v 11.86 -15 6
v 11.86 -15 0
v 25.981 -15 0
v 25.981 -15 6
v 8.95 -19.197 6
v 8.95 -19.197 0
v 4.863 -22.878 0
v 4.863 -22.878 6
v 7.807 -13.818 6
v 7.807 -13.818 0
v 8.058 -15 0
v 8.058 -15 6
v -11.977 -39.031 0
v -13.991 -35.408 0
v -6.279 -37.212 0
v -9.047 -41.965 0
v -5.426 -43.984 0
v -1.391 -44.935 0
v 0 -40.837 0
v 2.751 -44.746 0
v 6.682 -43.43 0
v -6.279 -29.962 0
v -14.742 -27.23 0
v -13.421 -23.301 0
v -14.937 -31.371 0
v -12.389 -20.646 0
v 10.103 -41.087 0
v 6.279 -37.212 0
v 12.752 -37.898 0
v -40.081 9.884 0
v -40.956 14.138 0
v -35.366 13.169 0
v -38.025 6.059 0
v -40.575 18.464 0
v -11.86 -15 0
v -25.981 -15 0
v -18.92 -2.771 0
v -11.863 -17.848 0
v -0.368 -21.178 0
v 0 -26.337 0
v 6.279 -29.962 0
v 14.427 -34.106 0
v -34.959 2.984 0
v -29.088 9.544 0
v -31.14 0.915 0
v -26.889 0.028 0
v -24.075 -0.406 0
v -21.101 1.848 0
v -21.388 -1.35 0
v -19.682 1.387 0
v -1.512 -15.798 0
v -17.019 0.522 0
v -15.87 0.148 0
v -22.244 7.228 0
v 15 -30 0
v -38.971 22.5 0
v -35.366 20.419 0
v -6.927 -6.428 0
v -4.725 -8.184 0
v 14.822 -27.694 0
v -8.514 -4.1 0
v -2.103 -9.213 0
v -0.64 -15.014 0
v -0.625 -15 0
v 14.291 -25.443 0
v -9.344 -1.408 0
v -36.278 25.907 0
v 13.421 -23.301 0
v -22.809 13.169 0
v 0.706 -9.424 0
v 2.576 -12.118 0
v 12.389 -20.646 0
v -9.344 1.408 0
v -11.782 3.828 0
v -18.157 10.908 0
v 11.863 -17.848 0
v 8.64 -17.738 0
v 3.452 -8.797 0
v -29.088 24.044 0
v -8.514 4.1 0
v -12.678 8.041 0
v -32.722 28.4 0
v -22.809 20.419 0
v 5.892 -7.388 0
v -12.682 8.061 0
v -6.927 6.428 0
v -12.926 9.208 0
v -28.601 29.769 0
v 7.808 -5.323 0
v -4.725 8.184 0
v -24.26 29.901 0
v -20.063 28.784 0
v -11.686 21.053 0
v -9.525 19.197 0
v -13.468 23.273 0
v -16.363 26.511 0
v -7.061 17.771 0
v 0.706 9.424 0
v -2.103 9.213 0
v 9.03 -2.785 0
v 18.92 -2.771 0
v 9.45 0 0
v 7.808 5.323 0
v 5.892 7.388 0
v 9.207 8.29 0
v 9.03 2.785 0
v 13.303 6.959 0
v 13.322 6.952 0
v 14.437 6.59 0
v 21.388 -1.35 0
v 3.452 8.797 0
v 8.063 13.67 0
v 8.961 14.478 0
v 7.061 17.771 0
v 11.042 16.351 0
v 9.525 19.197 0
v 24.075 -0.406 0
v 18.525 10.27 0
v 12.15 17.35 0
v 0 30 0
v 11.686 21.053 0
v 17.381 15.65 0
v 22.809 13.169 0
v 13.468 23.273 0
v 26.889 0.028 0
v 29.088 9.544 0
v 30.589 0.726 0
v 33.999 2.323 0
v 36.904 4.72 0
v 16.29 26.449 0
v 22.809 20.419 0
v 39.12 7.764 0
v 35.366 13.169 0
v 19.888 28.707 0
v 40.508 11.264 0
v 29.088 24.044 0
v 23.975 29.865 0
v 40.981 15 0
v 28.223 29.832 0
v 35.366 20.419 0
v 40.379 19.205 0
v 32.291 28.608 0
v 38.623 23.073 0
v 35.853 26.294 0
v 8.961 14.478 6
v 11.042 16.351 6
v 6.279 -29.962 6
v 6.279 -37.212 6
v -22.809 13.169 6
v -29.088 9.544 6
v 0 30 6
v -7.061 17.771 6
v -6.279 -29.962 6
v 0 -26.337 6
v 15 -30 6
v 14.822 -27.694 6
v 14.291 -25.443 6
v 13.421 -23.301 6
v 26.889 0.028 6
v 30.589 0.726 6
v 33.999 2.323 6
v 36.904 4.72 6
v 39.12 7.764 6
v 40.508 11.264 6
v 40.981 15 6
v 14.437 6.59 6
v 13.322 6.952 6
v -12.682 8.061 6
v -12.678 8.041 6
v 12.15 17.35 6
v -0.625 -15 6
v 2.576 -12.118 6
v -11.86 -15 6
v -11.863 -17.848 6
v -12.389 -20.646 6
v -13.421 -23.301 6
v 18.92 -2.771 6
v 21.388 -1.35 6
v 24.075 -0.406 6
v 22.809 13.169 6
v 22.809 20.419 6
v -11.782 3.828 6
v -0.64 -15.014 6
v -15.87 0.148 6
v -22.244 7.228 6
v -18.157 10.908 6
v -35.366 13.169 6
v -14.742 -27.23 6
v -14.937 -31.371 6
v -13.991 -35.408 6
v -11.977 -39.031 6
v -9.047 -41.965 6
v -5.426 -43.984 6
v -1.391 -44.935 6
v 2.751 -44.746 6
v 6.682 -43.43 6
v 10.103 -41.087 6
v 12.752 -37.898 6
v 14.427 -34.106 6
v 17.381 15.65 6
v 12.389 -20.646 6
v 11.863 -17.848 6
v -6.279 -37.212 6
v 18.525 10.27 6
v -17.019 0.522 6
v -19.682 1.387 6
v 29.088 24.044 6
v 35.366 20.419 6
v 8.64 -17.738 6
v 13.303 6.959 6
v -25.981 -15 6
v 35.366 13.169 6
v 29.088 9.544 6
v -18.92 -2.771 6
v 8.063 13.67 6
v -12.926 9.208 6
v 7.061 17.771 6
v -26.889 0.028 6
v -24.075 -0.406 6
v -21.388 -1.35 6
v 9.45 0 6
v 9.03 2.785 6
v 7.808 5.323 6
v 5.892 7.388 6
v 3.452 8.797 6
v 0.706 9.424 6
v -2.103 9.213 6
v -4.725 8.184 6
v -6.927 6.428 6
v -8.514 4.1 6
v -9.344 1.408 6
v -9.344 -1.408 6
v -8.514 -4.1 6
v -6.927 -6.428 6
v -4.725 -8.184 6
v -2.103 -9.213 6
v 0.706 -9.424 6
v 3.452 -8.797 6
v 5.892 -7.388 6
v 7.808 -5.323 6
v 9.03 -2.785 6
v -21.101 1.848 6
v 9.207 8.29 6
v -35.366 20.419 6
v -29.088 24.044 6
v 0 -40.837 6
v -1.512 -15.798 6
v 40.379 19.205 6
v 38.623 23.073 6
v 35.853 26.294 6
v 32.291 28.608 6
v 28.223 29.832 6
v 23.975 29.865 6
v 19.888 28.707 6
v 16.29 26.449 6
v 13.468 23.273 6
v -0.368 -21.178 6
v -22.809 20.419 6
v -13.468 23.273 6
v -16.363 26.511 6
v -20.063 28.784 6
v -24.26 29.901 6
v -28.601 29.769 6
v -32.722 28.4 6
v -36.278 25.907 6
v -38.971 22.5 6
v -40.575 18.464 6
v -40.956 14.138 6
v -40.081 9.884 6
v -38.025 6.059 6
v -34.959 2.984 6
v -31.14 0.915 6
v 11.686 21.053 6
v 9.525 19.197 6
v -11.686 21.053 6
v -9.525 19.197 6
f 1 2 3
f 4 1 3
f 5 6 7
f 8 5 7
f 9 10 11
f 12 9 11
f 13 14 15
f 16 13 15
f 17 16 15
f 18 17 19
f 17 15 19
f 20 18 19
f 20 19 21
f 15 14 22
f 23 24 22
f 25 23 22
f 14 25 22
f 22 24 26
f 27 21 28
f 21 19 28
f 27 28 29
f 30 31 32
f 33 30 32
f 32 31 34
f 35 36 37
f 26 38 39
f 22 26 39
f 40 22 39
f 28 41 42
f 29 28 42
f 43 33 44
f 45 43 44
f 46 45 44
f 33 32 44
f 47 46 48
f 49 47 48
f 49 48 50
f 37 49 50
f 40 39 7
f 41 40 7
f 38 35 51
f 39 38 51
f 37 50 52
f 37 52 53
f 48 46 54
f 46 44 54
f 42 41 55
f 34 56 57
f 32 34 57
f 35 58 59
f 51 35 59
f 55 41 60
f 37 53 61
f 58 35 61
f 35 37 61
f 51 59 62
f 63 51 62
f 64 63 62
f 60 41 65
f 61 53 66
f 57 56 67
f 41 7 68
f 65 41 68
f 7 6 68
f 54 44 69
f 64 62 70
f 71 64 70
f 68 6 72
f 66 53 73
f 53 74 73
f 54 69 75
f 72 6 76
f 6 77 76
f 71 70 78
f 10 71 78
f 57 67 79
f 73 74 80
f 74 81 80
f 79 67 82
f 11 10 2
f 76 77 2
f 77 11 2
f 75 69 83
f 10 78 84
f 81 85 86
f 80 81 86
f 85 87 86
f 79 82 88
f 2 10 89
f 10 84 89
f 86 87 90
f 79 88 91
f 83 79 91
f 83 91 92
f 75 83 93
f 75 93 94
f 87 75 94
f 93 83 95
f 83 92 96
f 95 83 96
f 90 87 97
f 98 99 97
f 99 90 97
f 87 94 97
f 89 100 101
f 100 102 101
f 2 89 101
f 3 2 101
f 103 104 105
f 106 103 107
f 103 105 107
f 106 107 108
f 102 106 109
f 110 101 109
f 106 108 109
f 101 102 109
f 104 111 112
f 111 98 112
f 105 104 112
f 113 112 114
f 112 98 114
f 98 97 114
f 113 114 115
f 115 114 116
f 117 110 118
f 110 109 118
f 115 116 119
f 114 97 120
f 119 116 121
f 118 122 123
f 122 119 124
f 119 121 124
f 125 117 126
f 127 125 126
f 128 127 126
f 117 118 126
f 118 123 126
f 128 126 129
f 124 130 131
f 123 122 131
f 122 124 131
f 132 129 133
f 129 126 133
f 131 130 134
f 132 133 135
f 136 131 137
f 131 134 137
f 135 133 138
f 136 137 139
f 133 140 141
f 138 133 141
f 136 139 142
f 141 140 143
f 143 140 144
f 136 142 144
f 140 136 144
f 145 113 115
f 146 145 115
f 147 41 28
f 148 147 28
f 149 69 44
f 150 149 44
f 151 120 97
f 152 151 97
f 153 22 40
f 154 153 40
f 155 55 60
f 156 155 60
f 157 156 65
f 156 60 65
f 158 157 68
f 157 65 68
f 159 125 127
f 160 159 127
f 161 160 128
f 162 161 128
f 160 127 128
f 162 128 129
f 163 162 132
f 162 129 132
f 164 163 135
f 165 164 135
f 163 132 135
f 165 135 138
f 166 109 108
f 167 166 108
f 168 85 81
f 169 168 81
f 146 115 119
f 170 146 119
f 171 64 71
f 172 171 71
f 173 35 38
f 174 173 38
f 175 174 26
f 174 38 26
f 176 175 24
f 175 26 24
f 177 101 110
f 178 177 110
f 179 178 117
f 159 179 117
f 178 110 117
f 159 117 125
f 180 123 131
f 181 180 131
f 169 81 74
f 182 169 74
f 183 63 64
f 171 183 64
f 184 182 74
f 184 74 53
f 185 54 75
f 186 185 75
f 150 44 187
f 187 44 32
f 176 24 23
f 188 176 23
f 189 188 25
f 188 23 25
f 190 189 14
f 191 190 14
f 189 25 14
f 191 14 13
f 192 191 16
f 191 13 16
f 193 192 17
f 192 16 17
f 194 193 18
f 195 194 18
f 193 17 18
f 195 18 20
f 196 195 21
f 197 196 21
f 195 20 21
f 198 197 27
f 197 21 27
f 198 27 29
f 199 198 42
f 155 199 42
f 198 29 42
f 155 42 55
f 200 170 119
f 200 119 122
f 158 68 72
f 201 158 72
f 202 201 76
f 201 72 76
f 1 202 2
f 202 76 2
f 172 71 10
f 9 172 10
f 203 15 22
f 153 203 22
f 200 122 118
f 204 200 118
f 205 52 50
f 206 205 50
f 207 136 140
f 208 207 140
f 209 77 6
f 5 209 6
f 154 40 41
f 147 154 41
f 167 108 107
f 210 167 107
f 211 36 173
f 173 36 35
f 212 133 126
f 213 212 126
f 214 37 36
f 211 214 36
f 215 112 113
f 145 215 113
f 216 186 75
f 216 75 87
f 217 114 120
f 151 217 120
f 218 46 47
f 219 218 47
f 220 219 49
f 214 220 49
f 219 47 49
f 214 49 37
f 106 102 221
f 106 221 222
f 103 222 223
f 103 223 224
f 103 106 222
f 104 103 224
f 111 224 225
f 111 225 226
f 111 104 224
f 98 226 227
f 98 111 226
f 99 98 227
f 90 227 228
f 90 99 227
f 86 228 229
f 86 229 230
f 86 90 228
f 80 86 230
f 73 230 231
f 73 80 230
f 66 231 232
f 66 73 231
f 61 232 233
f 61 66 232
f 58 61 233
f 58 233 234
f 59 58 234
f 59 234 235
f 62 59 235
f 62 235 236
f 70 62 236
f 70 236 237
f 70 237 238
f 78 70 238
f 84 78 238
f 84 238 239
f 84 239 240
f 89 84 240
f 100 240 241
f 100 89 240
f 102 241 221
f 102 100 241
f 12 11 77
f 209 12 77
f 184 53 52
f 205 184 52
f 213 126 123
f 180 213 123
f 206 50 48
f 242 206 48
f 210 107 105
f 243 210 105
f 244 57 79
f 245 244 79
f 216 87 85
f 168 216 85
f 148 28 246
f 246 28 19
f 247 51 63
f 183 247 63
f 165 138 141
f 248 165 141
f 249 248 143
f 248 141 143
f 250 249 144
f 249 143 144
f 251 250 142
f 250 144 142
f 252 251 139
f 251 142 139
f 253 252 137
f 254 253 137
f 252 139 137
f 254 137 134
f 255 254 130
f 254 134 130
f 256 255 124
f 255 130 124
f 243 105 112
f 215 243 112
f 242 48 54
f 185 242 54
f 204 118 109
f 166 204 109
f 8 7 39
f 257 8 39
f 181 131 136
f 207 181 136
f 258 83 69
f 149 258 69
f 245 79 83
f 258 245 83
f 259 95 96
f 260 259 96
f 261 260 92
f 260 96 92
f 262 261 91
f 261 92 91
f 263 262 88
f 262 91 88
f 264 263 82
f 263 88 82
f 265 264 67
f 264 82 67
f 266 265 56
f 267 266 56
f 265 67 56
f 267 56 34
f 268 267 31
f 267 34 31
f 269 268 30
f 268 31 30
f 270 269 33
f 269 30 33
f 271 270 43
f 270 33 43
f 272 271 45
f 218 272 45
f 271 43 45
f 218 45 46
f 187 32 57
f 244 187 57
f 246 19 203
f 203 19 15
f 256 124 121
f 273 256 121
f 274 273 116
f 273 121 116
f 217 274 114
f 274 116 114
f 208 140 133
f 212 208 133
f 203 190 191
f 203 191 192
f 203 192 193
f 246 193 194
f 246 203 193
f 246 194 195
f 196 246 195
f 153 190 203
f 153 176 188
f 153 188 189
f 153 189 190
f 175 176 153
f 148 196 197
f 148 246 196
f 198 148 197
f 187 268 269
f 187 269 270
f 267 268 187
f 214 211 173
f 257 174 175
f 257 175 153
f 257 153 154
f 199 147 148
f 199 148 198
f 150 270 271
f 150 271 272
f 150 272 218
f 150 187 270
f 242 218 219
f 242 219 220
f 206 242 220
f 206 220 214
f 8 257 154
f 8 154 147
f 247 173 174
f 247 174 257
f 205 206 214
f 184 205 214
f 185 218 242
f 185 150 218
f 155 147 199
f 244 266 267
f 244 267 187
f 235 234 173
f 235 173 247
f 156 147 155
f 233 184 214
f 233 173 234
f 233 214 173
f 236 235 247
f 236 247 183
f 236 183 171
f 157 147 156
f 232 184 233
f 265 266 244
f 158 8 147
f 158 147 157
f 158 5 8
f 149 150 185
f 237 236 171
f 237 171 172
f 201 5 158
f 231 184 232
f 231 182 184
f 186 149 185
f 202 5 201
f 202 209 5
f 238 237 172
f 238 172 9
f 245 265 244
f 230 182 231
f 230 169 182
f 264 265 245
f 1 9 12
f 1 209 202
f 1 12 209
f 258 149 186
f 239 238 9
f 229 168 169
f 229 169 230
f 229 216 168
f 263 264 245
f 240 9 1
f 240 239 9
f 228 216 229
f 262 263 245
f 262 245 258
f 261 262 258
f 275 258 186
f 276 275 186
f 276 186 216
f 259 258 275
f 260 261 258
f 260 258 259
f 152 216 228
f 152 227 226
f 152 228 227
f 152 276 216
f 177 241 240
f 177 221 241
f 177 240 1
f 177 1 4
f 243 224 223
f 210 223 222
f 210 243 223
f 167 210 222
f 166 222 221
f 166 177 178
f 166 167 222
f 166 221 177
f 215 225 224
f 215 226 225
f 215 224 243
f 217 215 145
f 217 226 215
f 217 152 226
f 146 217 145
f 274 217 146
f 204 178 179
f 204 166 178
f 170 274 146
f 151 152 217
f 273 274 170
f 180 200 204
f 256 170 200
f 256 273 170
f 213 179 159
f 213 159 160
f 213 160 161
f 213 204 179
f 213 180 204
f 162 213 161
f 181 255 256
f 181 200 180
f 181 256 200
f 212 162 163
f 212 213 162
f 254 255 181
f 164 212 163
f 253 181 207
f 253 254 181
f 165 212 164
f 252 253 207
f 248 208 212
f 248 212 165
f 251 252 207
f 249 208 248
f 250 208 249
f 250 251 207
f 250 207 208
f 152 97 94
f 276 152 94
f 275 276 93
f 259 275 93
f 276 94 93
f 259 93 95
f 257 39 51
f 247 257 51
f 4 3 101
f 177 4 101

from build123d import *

# Parameters (mm, degrees)
F0_R     = 9.45
F1_DEPTH = 6


with BuildPart() as f1:
    # F0 (on Top) → F1 (new body)
    with BuildSketch(Plane.XY):
        Polygon((11.8595659331, -15), (25.9807621135, -15), (18.9201640233, -2.7706853759), (13.302852552, 6.9587834943), (9.2066626406, 8.2897162761), (8.0631483411, 13.6695280801), (8.9614312964, 14.478345686), (7.0605980902, 17.7706853759), (0, 30), (-7.0605980902, 17.7706853759), (-12.6779095615, 8.0412165057), (-11.7824362055, 3.8283455928), (-15.8697327457, 0.1481272578), (-17.0193308171, 0.521654314), (-18.9201640233, -2.7706853759), (-25.9807621135, -15), (-11.8595659331, -15), (-0.6249429905, -15), (2.5757735649, -12.1180618689), (7.8065844046, -13.8176553379), (8.0578995207, -15), align=None)
        Circle(F0_R, mode=Mode.SUBTRACT)
        with BuildLine():
            ThreePointArc((13.4207676072, -23.3005226447), (12.0614730092, -19.25910479), (11.8595659331, -15))
            Line((11.8595659331, -15), (8.0578995207, -15))
            Line((8.0578995207, -15), (8.6399217922, -17.7381995032))
            ThreePointArc((8.6399217922, -17.7381995032), (11.3755599368, -20.2226467731), (13.4207676072, -23.3005226447))
        make_face()
        with BuildLine():
            Line((13.302852552, 6.9587834943), (18.9201640233, -2.7706853759))
            ThreePointArc((18.9201640233, -2.7706853759), (22.7096105069, -0.815989638), (26.8892283353, 0.0275356362))
            ThreePointArc((26.8892283353, 0.0275356362), (19.1613457519, 1.6397769298), (13.3222745374, 6.9524729087))
            Line((13.3222745374, 6.9524729087), (13.302852552, 6.9587834943))
        make_face()
        with BuildLine():
            ThreePointArc((15, -30), (14.5998546929, -26.5584534078), (13.4207676072, -23.3005226447))
            ThreePointArc((13.4207676072, -23.3005226447), (11.3755599368, -20.2226467731), (8.6399217922, -17.7381995032))
            Line((8.6399217922, -17.7381995032), (8.9500987041, -19.1974671419))
            Line((8.9500987041, -19.1974671419), (4.8628021639, -22.8776854769))
            Line((4.8628021639, -22.8776854769), (-0.3680086757, -21.1780920079))
            Line((-0.3680086757, -21.1780920079), (-1.5115229752, -15.7982802038))
            Line((-1.5115229752, -15.7982802038), (-0.6401191106, -15.0136646399))
            ThreePointArc((-0.6401191106, -15.0136646399), (-8.1605843982, -17.4141006567), (-13.4207676072, -23.3005226447))
            ThreePointArc((-13.4207676072, -23.3005226447), (-3.4415465922, -44.5998546929), (15, -30))
        make_face()
        Polygon((6.2786841774, -37.2124443067), (0, -40.8374443067), (-6.2786841774, -37.2124443067), (-6.2786841774, -29.9624443067), (0, -26.3374443067), (6.2786841774, -29.9624443067), align=None, mode=Mode.SUBTRACT)
        with BuildLine():
            ThreePointArc((13.3222745374, 6.9524729087), (19.1613457519, 1.6397769298), (26.8892283353, 0.0275356362))
            ThreePointArc((26.8892283353, 0.0275356362), (36.903833873, 4.7196058764), (40.9807621135, 15))
            ThreePointArc((40.9807621135, 15), (30.3002226828, 29.3646183517), (13.4684607282, 23.2729870084))
            ThreePointArc((13.4684607282, 23.2729870084), (11.8255458689, 19.9628472741), (11.041770491, 16.3514915103))
            Line((11.041770491, 16.3514915103), (12.1504448812, 17.3497464151))
            Line((12.1504448812, 17.3497464151), (17.3812557208, 15.650152946))
            Line((17.3812557208, 15.650152946), (18.5247700203, 10.270341142))
            Line((18.5247700203, 10.270341142), (14.4374734802, 6.590122807))
            Line((14.4374734802, 6.590122807), (13.3222745374, 6.9524729087))
        make_face()
        Polygon((29.0875800178, 24.0437221533), (35.3662641952, 20.4187221533), (35.3662641952, 13.1687221533), (29.0875800178, 9.5437221533), (22.8088958404, 13.1687221533), (22.8088958404, 20.4187221533), align=None, mode=Mode.SUBTRACT)
        with BuildLine():
            Line((-0.6401191106, -15.0136646399), (-0.6249429905, -15))
            Line((-0.6249429905, -15), (-11.8595659331, -15))
            ThreePointArc((-11.8595659331, -15), (-12.0614730092, -19.25910479), (-13.4207676072, -23.3005226447))
            ThreePointArc((-13.4207676072, -23.3005226447), (-8.1605843982, -17.4141006567), (-0.6401191106, -15.0136646399))
        make_face()
        with BuildLine():
            Line((7.0605980902, 17.7706853759), (8.9614312964, 14.478345686))
            Line((8.9614312964, 14.478345686), (11.041770491, 16.3514915103))
            ThreePointArc((11.041770491, 16.3514915103), (11.8255458689, 19.9628472741), (13.4684607282, 23.2729870084))
            ThreePointArc((13.4684607282, 23.2729870084), (10.6481374977, 20.0750944281), (7.0605980902, 17.7706853759))
        make_face()
        with BuildLine():
            ThreePointArc((-26.8892283353, 0.0275356362), (-22.7096105069, -0.815989638), (-18.9201640233, -2.7706853759))
            Line((-18.9201640233, -2.7706853759), (-17.0193308171, 0.521654314))
            Line((-17.0193308171, 0.521654314), (-19.6816922832, 1.3867079928))
            ThreePointArc((-19.6816922832, 1.3867079928), (-23.2011058057, 0.259799499), (-26.8892283353, 0.0275356362))
        make_face()
        with BuildLine():
            Line((-12.6779095615, 8.0412165057), (-7.0605980902, 17.7706853759))
            ThreePointArc((-7.0605980902, 17.7706853759), (-10.6481374977, 20.0750944281), (-13.4684607282, 23.2729870084))
            ThreePointArc((-13.4684607282, 23.2729870084), (-11.6161437618, 19.3194605693), (-10.9807621135, 15))
            ThreePointArc((-10.9807621135, 15), (-11.4123184715, 11.4278228138), (-12.6821554268, 8.0611917312))
            Line((-12.6821554268, 8.0611917312), (-12.6779095615, 8.0412165057))
        make_face()
        with BuildLine():
            ThreePointArc((-13.4684607282, 23.2729870084), (-38.9711431703, 22.5), (-26.8892283353, 0.0275356362))
            ThreePointArc((-26.8892283353, 0.0275356362), (-23.2011058057, 0.259799499), (-19.6816922832, 1.3867079928))
            Line((-19.6816922832, 1.3867079928), (-21.1005435853, 1.8477207269))
            Line((-21.1005435853, 1.8477207269), (-22.2440578848, 7.2275325309))
            Line((-22.2440578848, 7.2275325309), (-18.1567613447, 10.9077508659))
            Line((-18.1567613447, 10.9077508659), (-12.925950505, 9.2081573968))
            Line((-12.925950505, 9.2081573968), (-12.6821554268, 8.0611917312))
            ThreePointArc((-12.6821554268, 8.0611917312), (-11.4123184715, 11.4278228138), (-10.9807621135, 15))
            ThreePointArc((-10.9807621135, 15), (-11.6161437618, 19.3194605693), (-13.4684607282, 23.2729870084))
        make_face()
        Polygon((-35.3662641952, 13.1687221533), (-35.3662641952, 20.4187221533), (-29.0875800178, 24.0437221533), (-22.8088958404, 20.4187221533), (-22.8088958404, 13.1687221533), (-29.0875800178, 9.5437221533), align=None, mode=Mode.SUBTRACT)
    extrude(amount=F1_DEPTH)


solid = f1.part
